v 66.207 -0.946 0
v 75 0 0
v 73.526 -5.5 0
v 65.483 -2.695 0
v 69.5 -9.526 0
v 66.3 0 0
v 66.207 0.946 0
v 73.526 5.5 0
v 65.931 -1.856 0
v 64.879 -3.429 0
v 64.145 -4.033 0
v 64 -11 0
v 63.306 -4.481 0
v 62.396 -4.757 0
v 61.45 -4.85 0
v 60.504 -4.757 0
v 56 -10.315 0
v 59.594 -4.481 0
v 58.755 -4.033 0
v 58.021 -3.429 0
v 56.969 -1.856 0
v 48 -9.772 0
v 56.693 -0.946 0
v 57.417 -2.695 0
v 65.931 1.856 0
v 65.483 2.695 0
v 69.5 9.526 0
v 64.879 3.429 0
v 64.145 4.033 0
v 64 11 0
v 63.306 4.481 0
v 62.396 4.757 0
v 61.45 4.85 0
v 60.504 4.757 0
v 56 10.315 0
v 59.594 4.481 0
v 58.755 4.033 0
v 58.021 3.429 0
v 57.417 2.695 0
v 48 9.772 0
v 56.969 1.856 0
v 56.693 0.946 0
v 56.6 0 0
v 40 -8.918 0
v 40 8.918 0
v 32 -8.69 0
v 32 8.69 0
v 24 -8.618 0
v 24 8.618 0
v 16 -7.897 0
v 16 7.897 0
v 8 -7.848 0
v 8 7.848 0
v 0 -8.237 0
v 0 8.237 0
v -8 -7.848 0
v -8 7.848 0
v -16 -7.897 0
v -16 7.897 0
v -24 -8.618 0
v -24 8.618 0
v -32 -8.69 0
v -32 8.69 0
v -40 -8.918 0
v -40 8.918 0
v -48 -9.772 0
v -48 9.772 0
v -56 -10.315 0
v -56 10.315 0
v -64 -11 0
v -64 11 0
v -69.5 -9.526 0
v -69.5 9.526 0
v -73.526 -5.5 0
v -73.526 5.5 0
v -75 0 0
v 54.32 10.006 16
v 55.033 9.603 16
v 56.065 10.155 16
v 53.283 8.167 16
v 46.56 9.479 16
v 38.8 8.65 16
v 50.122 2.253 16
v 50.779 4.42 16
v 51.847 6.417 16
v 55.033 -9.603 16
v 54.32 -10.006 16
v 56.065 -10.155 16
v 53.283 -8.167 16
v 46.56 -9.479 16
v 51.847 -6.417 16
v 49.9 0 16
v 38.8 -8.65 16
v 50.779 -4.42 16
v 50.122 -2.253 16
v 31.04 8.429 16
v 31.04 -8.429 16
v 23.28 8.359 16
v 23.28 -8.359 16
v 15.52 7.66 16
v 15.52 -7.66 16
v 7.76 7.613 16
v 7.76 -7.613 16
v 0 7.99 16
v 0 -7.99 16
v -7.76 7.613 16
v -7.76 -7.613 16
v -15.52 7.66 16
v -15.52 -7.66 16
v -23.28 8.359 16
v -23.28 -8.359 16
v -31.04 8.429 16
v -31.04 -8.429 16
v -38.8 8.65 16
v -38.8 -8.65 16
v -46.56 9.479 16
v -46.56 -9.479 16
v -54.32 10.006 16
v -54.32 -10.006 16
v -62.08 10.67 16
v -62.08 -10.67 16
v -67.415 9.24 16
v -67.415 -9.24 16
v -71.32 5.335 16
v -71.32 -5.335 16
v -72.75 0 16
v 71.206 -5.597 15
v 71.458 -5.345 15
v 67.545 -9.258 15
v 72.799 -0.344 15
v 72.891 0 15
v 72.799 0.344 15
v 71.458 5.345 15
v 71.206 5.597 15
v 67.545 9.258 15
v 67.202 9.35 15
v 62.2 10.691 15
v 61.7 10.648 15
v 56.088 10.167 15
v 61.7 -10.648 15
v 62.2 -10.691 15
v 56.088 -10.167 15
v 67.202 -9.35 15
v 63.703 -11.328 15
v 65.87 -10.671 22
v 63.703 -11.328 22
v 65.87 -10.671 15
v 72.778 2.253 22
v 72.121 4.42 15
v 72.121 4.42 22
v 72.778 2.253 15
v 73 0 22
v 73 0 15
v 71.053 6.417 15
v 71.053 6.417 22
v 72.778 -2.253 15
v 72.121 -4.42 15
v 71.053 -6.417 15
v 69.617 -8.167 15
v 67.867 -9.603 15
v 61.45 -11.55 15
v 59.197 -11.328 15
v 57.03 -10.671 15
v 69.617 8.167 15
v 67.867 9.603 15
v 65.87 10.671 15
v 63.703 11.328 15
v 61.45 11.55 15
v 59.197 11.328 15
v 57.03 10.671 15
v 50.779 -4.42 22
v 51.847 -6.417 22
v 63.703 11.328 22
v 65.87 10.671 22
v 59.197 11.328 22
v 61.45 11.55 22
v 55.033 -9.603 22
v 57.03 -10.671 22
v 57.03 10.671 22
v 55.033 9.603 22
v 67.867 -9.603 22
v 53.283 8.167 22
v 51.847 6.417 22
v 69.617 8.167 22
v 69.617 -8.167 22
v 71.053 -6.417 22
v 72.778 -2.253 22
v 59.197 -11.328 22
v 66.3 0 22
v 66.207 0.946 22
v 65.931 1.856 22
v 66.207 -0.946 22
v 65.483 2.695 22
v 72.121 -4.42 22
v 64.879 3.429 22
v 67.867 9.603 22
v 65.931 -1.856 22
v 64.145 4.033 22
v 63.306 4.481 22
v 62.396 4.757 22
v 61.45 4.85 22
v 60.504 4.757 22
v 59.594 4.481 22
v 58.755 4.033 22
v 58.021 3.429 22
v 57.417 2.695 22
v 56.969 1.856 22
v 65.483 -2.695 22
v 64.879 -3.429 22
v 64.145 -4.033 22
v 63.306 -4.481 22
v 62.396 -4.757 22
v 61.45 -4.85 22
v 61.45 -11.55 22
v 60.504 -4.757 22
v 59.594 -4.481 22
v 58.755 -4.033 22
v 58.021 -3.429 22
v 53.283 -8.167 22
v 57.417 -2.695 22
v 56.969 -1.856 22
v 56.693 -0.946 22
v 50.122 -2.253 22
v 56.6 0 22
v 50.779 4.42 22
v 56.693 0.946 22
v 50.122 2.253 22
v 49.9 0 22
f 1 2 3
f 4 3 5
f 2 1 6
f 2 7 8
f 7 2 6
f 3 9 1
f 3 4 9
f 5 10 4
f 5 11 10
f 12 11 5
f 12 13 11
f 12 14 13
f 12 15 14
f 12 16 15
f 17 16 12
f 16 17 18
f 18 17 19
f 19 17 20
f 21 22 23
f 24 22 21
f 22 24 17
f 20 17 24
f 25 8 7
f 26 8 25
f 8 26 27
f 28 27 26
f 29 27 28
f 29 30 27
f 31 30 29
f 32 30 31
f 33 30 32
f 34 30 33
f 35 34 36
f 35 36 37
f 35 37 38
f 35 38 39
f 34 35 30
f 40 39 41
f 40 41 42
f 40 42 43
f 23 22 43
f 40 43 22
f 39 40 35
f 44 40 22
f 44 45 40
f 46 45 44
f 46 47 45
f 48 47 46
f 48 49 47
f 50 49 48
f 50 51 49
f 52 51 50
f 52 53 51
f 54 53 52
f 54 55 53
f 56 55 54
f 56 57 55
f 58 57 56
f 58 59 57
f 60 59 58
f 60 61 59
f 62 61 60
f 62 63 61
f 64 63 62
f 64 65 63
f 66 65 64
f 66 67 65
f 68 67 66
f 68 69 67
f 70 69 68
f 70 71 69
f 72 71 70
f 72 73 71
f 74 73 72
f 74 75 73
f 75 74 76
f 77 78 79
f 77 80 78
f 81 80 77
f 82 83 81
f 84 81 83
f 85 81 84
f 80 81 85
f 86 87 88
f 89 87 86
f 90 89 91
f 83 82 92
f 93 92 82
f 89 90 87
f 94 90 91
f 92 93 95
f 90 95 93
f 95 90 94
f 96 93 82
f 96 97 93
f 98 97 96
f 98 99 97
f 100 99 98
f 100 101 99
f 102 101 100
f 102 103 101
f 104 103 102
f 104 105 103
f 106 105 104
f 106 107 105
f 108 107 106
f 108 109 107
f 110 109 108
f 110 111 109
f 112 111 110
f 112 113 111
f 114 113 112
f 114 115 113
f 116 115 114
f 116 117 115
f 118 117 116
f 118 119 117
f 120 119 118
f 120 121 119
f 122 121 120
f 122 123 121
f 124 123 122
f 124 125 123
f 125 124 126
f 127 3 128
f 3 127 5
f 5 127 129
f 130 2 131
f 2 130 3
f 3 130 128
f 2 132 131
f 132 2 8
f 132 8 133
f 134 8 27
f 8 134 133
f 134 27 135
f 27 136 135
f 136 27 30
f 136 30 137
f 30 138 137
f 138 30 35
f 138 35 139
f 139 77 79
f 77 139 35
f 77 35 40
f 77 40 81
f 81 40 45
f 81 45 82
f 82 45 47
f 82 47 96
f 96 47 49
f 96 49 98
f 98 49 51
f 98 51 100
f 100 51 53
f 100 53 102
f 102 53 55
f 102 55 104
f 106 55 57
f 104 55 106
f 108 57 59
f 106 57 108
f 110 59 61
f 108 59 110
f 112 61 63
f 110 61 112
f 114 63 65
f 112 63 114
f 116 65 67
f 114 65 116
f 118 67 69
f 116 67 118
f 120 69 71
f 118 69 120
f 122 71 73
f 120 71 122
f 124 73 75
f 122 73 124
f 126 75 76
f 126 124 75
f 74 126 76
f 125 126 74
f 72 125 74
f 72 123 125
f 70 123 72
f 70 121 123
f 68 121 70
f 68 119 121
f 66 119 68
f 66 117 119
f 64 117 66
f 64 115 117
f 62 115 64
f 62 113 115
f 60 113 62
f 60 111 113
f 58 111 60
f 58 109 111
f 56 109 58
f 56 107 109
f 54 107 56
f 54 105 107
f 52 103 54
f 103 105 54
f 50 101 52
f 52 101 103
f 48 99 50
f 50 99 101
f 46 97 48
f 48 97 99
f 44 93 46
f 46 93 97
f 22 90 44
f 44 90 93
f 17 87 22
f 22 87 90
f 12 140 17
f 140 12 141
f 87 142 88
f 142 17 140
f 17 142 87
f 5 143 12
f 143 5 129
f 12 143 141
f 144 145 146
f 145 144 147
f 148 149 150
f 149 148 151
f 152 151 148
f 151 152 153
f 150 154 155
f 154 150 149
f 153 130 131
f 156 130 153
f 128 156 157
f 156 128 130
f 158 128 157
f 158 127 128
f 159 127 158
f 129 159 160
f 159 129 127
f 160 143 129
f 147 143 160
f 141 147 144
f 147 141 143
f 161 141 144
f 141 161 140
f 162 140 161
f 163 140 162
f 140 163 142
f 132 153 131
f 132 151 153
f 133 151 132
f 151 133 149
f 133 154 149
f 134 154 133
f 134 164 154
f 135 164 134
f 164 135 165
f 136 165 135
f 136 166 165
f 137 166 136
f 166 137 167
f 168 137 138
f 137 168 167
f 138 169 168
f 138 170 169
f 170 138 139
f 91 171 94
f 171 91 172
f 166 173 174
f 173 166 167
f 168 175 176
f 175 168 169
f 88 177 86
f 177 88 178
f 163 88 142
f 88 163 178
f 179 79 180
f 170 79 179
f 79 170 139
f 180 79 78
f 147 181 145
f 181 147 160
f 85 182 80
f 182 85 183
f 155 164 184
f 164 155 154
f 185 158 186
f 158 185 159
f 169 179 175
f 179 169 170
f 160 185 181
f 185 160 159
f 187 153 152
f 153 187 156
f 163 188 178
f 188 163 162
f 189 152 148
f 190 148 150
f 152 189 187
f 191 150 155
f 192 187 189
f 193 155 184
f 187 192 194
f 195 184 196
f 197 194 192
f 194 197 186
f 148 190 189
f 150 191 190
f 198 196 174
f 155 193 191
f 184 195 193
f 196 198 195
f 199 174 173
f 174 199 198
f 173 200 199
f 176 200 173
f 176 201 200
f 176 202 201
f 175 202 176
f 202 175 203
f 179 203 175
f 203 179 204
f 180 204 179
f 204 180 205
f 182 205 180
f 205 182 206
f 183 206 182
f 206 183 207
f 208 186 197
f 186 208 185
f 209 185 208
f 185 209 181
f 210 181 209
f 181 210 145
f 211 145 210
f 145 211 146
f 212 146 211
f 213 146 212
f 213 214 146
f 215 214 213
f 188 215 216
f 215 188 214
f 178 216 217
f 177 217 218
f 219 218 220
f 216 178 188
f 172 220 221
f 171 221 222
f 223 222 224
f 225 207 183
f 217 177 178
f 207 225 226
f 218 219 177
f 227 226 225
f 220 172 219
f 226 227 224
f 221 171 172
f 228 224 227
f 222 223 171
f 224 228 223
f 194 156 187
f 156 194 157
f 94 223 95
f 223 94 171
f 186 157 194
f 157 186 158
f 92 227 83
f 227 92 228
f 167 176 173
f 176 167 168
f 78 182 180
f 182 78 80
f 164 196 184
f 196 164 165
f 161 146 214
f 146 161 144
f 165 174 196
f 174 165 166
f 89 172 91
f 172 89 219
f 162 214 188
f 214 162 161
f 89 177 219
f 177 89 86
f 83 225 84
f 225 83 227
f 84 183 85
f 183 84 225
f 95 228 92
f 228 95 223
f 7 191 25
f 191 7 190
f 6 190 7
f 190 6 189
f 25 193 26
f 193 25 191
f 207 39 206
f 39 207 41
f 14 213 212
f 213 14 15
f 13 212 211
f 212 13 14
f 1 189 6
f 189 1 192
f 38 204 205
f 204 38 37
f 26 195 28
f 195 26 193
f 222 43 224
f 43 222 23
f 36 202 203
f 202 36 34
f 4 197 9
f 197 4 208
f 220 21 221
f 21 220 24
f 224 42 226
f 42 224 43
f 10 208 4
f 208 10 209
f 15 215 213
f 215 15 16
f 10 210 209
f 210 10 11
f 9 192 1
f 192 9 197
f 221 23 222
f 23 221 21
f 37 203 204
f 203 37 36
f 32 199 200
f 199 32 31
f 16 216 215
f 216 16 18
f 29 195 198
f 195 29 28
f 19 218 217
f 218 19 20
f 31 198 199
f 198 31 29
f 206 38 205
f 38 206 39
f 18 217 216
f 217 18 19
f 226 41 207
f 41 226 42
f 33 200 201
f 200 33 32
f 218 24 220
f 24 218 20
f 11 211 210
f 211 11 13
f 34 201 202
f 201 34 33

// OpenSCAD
$fn = 32;

// ----------------------------------------------------------------------
// Handle: 150 x 22 mm grip, 16 mm thick
// ----------------------------------------------------------------------

// --- parameters (mm) ---
length = 150;             // grip length
width = 22;               // grip width
thickness = 16;           // grip thickness
waist = 0.72;             // width factor at the middle
draft = 0.97;             // top face scale of the extrusion
scallops = 5;             // finger rests per side
ripple = 0.04;            // depth factor of the finger rests
boss_d = 23.1;            // mounting boss diameter
boss_h = 6;               // mounting boss height
boss_hole_d = 9.7;        // screw clearance through the boss
boss_r = 61.45;           // boss centre from the grip centre

/* ergonomic grip outline, closed spline-like polygon in the XY plane */
grip = [[-64, 11], [-56, 10.315], [-48, 9.772], [-40, 8.918], [-32, 8.69], [-24, 8.618], [-16, 7.897], [-8, 7.848], [0, 8.237], [8, 7.848], [16, 7.897], [24, 8.618], [32, 8.69], [40, 8.918], [48, 9.772], [56, 10.315], [64, 11], [69.5, 9.526], [73.526, 5.5], [75, 0], [73.526, -5.5], [69.5, -9.526], [64, -11], [64, -11], [56, -10.315], [48, -9.772], [40, -8.918], [32, -8.69], [24, -8.618], [16, -7.897], [8, -7.848], [0, -8.237], [-8, -7.848], [-16, -7.897], [-24, -8.618], [-32, -8.69], [-40, -8.918], [-48, -9.772], [-56, -10.315], [-64, -11], [-69.5, -9.526], [-73.526, -5.5], [-75, 0], [-73.526, 5.5], [-69.5, 9.526], [-64, 11]];

module grip_body() {
  linear_extrude(height = thickness, scale = draft) polygon(grip);
}

module boss_body() {
  /* sunk 1 mm into the grip so the joint overlaps */
  translate([boss_r, 0, thickness - 1]) cylinder(h = boss_h + 1, d = boss_d);
}

difference() {
  union() {
    grip_body();
    boss_body();
  }
  translate([boss_r, 0, -1]) cylinder(h = thickness + boss_h + 2, d = boss_hole_d);
}
